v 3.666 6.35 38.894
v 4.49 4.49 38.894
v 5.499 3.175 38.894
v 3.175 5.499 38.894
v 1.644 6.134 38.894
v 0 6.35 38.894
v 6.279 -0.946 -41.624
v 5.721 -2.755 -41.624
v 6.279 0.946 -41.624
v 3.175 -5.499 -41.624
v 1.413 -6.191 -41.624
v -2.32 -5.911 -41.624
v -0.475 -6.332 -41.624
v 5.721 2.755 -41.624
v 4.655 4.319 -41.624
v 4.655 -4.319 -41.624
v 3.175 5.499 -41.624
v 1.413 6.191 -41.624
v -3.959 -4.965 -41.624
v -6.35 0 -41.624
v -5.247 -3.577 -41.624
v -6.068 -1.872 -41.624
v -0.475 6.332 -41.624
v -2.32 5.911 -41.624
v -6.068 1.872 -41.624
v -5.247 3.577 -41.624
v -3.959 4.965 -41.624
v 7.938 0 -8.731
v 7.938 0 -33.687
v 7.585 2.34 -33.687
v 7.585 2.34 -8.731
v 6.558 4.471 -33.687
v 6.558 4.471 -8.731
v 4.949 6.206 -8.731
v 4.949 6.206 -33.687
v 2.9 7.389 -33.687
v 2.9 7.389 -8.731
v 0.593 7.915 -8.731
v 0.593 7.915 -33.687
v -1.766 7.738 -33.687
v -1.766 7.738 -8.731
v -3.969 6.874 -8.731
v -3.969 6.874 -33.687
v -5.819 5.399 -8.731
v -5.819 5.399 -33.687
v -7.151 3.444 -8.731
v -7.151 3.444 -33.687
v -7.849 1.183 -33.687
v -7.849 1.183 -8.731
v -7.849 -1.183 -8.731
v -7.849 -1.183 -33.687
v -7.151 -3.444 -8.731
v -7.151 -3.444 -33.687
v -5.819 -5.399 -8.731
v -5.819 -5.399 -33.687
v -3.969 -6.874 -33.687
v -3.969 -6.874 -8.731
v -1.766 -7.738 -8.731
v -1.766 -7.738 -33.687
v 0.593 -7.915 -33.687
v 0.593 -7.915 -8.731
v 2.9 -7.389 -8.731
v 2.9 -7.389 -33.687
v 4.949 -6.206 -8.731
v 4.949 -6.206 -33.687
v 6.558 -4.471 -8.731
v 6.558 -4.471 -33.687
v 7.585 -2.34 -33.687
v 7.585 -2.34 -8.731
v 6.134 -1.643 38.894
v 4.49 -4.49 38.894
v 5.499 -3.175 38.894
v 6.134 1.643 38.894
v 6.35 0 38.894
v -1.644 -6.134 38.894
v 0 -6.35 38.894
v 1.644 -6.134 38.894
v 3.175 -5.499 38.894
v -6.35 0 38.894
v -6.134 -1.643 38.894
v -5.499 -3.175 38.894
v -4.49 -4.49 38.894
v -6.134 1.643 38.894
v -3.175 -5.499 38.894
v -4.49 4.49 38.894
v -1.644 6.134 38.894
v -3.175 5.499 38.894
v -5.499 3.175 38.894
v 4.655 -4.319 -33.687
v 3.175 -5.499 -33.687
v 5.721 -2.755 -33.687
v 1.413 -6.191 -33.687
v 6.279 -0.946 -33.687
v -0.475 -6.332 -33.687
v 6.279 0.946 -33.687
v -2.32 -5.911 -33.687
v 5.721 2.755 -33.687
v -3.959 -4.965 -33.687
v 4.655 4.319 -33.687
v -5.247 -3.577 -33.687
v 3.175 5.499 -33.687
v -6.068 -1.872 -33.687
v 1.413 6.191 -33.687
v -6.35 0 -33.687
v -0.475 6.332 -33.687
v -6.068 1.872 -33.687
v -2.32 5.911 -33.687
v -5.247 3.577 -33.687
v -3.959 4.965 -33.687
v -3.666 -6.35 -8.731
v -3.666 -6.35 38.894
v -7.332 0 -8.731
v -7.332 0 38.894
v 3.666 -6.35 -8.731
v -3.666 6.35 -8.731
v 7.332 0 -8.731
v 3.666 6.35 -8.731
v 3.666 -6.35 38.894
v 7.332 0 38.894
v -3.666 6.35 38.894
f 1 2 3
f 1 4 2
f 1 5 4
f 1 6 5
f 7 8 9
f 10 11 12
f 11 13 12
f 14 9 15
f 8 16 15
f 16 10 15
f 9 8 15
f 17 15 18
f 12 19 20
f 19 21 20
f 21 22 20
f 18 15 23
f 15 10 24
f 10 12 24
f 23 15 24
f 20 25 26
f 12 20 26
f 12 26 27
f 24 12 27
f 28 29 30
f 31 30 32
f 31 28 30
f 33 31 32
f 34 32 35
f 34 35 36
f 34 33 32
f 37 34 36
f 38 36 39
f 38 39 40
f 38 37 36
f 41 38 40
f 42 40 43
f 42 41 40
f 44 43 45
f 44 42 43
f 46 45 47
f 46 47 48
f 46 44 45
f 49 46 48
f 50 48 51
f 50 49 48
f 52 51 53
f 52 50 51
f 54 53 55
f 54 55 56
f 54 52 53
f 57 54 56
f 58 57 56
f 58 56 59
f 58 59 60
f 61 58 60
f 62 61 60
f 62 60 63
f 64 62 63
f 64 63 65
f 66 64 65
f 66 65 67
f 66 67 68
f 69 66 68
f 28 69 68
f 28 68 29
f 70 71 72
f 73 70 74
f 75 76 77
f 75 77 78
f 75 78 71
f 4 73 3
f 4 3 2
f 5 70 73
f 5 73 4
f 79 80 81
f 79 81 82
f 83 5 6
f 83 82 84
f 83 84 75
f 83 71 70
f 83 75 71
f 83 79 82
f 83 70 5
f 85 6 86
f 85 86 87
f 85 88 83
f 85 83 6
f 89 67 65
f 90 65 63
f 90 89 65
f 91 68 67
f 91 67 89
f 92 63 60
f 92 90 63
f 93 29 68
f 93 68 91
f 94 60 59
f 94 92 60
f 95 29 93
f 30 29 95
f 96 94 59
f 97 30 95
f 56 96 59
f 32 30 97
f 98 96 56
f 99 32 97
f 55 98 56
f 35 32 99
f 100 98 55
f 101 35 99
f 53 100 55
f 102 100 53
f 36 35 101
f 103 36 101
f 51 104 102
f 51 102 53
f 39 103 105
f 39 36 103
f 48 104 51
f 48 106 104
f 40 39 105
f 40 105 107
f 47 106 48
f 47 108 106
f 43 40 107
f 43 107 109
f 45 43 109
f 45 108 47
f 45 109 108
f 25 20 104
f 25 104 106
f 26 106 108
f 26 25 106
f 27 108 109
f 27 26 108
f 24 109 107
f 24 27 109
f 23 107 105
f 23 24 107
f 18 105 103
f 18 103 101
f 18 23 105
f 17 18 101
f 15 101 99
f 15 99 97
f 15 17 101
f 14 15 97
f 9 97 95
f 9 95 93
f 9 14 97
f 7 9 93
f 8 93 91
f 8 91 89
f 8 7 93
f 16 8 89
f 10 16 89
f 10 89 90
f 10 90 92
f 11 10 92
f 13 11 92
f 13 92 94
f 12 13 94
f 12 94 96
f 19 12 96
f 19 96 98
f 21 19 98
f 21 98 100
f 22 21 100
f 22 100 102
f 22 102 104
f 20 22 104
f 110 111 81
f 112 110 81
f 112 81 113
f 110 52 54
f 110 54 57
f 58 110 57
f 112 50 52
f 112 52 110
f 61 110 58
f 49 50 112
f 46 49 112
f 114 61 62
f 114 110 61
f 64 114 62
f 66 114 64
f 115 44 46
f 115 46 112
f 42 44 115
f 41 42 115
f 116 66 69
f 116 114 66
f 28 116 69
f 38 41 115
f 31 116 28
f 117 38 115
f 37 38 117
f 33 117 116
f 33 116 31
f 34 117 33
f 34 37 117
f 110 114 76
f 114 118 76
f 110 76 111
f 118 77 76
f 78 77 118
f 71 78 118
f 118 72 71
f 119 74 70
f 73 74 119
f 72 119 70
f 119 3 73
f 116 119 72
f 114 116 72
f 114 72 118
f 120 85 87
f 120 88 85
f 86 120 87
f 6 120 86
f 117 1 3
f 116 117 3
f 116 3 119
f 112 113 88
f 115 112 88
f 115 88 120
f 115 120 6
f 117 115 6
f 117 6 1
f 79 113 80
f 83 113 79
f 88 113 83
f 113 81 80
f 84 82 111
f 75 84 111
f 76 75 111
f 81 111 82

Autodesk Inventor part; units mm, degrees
ref_plane "YZ Plane" through (0, 0, 0) normal (1, 0, 0) x (0, 1, 0)
ref_plane "XZ Plane" through (0, 0, 0) normal (0, 1, 0) x (-1, 0, 0)
ref_plane "XY Plane" through (0, 0, 0) normal (0, 0, 1) x (1, 0, 0)
sketch "Sketch1" plane through (0, 0, 0) normal (0, 0, 1) x (1, 0, 0)
  circle A0 centre (0, 0) radius 7.9375
  dimension "d0" = 15.875
extrude "Extrusion1" add sketch "Sketch1" along normal mid plane 90.4875
sketch "Sketch2" plane through (0, 0, 45.2437) normal (0, 0, 1) x (1, 0, 0)
  line L0 (-3.6662, 6.35) -> (3.6662, 6.35)
  line L1 (3.6662, 6.35) -> (7.3323, 0)
  line L2 (7.3323, 0) -> (3.6662, -6.35)
  line L3 (3.6662, -6.35) -> (-3.6662, -6.35)
  line L4 (-3.6662, -6.35) -> (-7.3323, 0)
  line L5 (-7.3323, 0) -> (-3.6662, 6.35)
  circle A0 centre (0, 0) radius 7.9375 projected
  point P0 (0, -6.35)
  point P1 (0, 6.35)
  dimension "d3" = 12.7
extrude "Extrusion2" cut sketch "Sketch2" against normal blind 53.975
sketch "Sketch3" plane through (0, 0, 45.2437) normal (0, 0, 1) x (1, 0, 0)
  circle A0 centre (0, 0) radius 6.35
  circle A1 centre (0, 0) radius 7.9375 projected
  line L0 (3.6662, 6.35) -> (-3.6662, 6.35) projected
  line L1 (7.3323, 0) -> (3.6662, 6.35) projected
  line L2 (3.6662, -6.35) -> (7.3323, 0) projected
  line L3 (-3.6662, -6.35) -> (3.6662, -6.35) projected
  line L4 (-7.3323, 0) -> (-3.6662, -6.35) projected
  line L5 (-3.6662, 6.35) -> (-7.3323, 0) projected
  point P0 (-5.4993, 3.175)
  point P1 (0, 6.35)
  point P2 (-5.4993, -3.175)
  point P3 (0, -6.35)
  point P4 (5.4993, -3.175)
  point P5 (5.4993, 3.175)
  dimension "d6" = 12.7
extrude "Extrusion3" cut sketch "Sketch3" against normal blind 6.35 contours A0 L1 L2 | A0 L0 L1 | L2 L3 A0 | A0 L5 L0 | L3 L4 A0 | A0 L4 L5
sketch "Sketch6" plane through (0, 0, 0) normal (1, 0, 0) x (0, 1, 0)
  line L0 (7.9375, -45.2437) -> (-7.9375, -45.2437) construction
  line L1 (-7.9375, -45.2437) -> (-7.9375, -8.7312) construction
  line L2 (-7.9375, -8.7312) -> (-6.35, -8.7312) construction
  line L3 (-6.35, -8.7312) -> (-6.35, 38.8938) construction
  line L4 (-6.35, 38.8938) -> (-6.35, 45.2437) construction
  line L5 (-6.35, 45.2437) -> (6.35, 45.2437) construction
  line L6 (6.35, 45.2437) -> (6.35, 38.8938) construction
  line L7 (6.35, 38.8938) -> (6.35, -8.7312) construction
  line L8 (6.35, -8.7312) -> (7.9375, -8.7312) construction
  line L9 (7.9375, -8.7312) -> (7.9375, -45.2437) construction
  line L10 (6.35, 45.2437) -> (-6.35, 45.2437)
  line L11 (-6.35, 45.2437) -> (-6.35, 38.8938)
  line L12 (-6.35, 38.8938) -> (6.35, 38.8938)
  line L13 (6.35, 38.8938) -> (6.35, 45.2437)
  line L14 (7.9375, -45.2437) -> (-7.9375, -45.2437) construction
  line L15 (-7.9375, -45.2437) -> (-7.9375, -8.7312) construction
  line L16 (-7.9375, -8.7312) -> (-6.35, -8.7312) construction
  line L17 (-6.35, -8.7312) -> (-6.35, 38.8938) construction
  line L18 (-6.35, 38.8938) -> (-6.35, 45.2437) construction
  line L19 (-6.35, 45.2437) -> (6.35, 45.2437) construction
  line L20 (6.35, 45.2437) -> (6.35, 38.8938) construction
  line L21 (6.35, 38.8938) -> (6.35, -8.7312) construction
  line L22 (6.35, -8.7312) -> (7.9375, -8.7312) construction
  line L23 (7.9375, -8.7312) -> (7.9375, -45.2437) construction
  line L24 (3.175, 38.8938) -> (6.35, 38.8938) construction
  line L25 (6.35, 38.8938) -> (-4.3066, 38.8938) construction
  line L26 (-3.175, 38.8938) -> (-6.35, 38.8938) construction
  line L27 (-7.9375, -45.2437) -> (-7.9375, -8.7312) construction
  line L28 (7.9375, -45.2437) -> (-7.9375, -45.2437)
  line L29 (-7.9375, -45.2437) -> (-7.9375, -41.6242)
  line L30 (-7.9375, -41.6242) -> (7.9375, -41.6242)
  line L31 (7.9375, -41.6242) -> (7.9375, -45.2437)
  point P0 (0, 0)
  dimension "d15" = 80.518
extrude "Extrusion6" cut sketch "Sketch6" along normal through all both and the other way through all
sketch "Sketch7" plane through (0, 0, -41.6242) normal (0, 0, -1) x (-1, 0, 0)
  circle A0 centre (0, 0) radius 6.35
  circle A1 centre (0, 0) radius 7.9375 construction
  circle A2 centre (0, 0) radius 7.9375
  circle A3 centre (0, 0) radius 7.9375 construction
  dimension "d18" = 12.7
extrude "Extrusion7" cut sketch "Sketch7" against normal blind 7.9375
properties part number "EL2-C2-003" material "Aluminum 6061"
